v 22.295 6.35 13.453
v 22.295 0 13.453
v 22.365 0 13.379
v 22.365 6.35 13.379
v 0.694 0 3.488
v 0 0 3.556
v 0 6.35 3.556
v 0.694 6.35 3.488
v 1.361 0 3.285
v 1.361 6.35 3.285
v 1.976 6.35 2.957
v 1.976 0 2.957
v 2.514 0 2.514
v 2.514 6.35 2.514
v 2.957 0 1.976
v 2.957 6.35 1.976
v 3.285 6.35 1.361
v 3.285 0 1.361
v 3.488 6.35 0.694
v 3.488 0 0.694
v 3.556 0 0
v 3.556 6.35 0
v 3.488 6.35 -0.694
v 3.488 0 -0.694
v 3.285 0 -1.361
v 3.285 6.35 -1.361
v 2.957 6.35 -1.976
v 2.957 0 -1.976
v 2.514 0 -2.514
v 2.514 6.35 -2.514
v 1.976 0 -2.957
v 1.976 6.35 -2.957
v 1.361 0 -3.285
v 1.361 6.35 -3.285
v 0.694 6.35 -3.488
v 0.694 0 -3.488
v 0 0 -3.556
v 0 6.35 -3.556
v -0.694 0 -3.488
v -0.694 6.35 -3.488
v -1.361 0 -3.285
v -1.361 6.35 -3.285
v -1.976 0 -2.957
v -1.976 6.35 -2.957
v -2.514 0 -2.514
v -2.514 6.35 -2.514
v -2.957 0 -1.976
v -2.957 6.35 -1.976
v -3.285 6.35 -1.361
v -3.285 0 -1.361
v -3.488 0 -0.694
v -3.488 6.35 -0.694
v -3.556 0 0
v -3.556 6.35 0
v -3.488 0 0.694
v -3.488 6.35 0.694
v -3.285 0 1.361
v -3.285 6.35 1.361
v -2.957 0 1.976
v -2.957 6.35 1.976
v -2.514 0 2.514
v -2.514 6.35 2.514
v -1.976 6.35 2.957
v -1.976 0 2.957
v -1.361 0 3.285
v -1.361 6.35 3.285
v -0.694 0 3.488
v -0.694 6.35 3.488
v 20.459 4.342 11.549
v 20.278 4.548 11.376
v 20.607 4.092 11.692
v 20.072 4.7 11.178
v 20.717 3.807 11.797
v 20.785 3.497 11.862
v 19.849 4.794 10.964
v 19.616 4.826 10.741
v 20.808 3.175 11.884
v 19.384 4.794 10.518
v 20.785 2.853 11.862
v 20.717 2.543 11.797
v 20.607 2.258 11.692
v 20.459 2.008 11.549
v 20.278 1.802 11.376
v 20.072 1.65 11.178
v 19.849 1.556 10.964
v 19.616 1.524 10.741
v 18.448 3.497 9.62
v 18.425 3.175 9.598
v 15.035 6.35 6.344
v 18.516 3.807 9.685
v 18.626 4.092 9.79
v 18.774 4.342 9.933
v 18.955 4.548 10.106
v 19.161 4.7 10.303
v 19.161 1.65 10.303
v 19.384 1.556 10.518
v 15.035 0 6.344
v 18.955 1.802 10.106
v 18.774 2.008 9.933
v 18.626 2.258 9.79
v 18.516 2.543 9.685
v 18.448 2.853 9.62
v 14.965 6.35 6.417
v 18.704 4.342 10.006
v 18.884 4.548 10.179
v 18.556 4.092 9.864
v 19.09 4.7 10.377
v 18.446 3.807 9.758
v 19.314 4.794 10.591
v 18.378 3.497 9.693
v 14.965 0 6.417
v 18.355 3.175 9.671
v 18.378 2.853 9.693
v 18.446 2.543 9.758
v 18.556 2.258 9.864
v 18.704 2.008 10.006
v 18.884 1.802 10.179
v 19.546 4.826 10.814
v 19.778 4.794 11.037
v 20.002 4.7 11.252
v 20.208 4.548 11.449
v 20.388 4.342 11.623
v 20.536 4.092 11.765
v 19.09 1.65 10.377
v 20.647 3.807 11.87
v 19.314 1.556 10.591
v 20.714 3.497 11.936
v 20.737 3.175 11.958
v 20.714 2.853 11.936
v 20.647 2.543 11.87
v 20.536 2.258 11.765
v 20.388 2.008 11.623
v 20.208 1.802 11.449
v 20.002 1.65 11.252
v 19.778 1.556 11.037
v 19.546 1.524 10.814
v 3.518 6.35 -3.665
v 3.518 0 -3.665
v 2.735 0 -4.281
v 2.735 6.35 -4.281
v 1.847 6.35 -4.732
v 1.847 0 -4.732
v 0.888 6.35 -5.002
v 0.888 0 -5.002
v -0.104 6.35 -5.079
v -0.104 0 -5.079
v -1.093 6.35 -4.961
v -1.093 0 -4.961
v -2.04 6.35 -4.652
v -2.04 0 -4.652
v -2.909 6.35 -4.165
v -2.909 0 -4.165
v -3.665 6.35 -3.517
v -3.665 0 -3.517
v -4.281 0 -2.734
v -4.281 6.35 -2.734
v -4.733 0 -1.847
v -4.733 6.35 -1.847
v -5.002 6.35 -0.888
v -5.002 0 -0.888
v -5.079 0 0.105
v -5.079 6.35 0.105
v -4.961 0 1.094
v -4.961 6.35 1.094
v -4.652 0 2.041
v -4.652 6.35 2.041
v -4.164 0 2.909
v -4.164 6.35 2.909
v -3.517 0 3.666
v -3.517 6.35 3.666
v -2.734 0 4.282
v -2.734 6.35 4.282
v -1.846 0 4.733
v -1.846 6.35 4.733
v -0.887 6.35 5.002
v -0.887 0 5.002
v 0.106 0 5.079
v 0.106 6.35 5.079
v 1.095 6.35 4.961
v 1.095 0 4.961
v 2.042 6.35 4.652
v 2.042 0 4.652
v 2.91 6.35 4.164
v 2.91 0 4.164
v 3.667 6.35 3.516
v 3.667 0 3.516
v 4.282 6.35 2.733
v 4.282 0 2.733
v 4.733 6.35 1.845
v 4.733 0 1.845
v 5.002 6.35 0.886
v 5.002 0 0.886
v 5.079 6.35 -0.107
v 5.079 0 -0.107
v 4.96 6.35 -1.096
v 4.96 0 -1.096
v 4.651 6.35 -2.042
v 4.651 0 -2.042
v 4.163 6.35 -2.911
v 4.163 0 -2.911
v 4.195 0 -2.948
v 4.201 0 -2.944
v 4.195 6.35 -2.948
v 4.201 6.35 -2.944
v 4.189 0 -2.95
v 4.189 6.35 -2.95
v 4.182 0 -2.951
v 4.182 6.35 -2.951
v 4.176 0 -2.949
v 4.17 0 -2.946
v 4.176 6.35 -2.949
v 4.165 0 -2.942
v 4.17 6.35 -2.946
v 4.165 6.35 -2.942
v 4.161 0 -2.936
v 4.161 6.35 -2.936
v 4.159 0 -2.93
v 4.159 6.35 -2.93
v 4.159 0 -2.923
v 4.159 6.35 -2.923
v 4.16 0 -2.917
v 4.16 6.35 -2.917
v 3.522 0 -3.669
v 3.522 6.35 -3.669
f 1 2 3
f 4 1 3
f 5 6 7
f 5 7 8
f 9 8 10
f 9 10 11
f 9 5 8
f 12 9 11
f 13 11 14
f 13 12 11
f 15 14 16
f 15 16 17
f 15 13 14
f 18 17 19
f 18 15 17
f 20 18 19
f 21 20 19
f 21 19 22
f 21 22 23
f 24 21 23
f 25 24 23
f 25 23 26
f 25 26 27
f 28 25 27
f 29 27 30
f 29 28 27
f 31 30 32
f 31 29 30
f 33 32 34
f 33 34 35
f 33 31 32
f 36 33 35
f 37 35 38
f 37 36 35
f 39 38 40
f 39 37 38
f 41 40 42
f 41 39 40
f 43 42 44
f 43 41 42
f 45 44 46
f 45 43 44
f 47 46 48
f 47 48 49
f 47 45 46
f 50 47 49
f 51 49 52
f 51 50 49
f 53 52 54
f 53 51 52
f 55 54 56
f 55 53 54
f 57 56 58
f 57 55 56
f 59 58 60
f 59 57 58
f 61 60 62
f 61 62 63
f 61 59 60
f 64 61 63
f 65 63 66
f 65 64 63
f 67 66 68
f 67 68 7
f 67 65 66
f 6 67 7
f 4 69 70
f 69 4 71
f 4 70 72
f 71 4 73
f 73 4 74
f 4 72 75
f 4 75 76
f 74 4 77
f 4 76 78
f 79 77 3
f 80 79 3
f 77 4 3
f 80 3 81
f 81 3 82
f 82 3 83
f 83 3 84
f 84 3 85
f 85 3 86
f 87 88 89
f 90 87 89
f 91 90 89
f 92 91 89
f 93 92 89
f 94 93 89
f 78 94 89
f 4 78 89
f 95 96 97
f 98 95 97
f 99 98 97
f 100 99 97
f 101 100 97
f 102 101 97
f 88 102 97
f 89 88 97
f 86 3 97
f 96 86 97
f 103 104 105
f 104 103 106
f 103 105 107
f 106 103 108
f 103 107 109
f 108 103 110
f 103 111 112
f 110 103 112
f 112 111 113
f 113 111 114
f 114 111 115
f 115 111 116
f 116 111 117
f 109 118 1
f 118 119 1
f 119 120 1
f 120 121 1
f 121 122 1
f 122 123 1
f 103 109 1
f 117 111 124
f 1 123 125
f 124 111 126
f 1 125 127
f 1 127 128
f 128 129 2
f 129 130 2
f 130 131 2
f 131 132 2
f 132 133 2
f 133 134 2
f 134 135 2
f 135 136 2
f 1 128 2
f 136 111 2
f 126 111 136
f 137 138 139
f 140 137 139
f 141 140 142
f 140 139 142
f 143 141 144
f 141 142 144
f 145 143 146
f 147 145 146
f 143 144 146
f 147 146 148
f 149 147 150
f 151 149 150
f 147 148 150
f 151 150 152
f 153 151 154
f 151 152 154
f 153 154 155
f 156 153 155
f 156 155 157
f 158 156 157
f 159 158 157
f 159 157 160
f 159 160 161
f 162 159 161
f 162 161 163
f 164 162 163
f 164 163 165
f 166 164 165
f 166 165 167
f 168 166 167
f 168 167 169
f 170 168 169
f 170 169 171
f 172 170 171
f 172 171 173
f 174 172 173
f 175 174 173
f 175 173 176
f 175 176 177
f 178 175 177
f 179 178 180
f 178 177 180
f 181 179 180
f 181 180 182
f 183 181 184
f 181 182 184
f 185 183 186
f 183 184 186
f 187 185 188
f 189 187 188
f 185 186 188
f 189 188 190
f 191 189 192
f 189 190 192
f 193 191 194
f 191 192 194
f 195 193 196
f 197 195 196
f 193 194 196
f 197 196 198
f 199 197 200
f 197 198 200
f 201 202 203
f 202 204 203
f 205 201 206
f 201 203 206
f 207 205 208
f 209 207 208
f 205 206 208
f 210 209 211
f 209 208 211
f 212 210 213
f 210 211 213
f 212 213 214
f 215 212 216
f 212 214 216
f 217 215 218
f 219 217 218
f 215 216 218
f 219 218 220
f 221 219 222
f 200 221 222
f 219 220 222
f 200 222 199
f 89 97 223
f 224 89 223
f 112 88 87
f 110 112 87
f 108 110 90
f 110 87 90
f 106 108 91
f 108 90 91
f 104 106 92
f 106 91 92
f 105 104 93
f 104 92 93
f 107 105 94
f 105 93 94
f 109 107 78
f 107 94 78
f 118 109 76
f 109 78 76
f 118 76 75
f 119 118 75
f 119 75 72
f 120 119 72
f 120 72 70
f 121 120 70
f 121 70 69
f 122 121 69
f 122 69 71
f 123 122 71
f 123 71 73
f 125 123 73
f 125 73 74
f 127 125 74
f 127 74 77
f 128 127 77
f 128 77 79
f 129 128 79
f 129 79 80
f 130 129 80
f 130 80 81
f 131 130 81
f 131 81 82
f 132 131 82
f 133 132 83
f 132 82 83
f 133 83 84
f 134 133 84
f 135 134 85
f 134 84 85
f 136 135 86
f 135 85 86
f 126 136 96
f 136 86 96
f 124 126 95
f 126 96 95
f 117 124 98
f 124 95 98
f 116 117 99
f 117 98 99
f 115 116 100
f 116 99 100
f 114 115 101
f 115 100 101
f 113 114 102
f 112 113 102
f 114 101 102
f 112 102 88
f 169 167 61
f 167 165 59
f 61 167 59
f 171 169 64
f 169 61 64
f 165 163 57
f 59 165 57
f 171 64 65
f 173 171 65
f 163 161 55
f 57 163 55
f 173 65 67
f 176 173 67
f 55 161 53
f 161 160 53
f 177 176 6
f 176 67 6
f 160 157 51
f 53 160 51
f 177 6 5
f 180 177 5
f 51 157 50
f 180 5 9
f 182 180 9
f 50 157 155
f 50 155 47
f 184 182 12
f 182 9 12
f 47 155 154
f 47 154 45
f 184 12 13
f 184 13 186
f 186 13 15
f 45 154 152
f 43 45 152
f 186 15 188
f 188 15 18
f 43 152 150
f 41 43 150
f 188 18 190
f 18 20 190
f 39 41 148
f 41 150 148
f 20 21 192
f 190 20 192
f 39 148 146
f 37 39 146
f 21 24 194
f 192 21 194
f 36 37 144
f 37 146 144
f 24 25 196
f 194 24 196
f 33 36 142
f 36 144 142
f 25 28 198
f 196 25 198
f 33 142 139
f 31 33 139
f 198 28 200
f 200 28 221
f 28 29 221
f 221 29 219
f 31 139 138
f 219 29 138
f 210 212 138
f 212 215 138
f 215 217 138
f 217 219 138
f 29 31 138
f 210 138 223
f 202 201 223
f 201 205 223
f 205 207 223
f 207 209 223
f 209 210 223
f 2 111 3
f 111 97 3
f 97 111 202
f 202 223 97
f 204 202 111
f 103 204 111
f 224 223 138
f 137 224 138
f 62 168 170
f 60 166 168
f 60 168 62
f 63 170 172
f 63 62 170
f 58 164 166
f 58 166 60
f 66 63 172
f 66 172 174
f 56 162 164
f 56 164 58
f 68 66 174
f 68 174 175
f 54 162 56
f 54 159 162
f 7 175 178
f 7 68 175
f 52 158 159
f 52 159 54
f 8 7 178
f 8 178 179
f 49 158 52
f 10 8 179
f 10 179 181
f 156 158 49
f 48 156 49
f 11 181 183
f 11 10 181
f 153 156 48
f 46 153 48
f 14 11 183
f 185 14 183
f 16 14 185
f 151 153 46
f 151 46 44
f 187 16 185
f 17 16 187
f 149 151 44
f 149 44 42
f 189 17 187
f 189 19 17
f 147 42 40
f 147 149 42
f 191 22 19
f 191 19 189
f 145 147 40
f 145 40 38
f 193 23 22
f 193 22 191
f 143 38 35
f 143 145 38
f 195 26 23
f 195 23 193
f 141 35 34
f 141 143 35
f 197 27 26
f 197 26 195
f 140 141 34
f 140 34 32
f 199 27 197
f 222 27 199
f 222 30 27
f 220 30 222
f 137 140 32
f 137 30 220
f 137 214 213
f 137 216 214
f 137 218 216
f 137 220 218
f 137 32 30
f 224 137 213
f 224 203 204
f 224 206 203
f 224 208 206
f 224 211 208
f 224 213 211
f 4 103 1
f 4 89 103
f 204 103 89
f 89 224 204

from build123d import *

# Parameters (mm, degrees)
SKETCH1_R           = 3.556
BOSS_EXTRUDE1_DEPTH = 6.35
SKETCH2_R           = 1.651
CUT_EXTRUDE1_DEPTH  = 6.35
FILLET1_R           = 0.0254


with BuildPart() as part:
    # Sketch1 → Boss-Extrude1 (new body)
    with BuildSketch(Plane(origin=(0, 0, 0), x_dir=(1, 0, 0), z_dir=(0, 1, 0))):
        with BuildLine():
            Line((22.365139772, -13.37924688), (15.035220761, -6.343773385))
            Line((15.035220761, -6.343773385), (3.521977792, 3.669378045))
            Line((3.521977792, 3.669378045), (3.517736747, 3.664959506))
            ThreePointArc((3.517736747, 3.664959506), (-3.784384399, -3.388928255), (4.029432062, 3.093554146))
            Line((4.029432062, 3.093554146), (14.964866026, -6.417072576))
            Line((14.964866026, -6.417072576), (22.294785037, -13.45254607))
            Line((22.294785037, -13.45254607), (22.365139772, -13.37924688))
        make_face()
        with Locations(Location((0, 0, 0), (0, 0, 270))):
            Circle(SKETCH1_R, mode=Mode.SUBTRACT)
    extrude(amount=BOSS_EXTRUDE1_DEPTH)

    # Sketch2 → Cut-Extrude1 (cut)
    with BuildSketch(Plane(origin=(3.305454811, 0, -4.914803593), x_dir=(-0.7214487215857361, 0, -0.6924678636025697), z_dir=(0.6924678636025697, 0, -0.7214487215857361))):
        with Locations((-22.608627396, 3.175)):
            Circle(SKETCH2_R)
    extrude(amount=-CUT_EXTRUDE1_DEPTH, mode=Mode.SUBTRACT)

    # Fillet1
    fillet1_edges = [part.edges().sort_by_distance(p)[0] for p in [
        (4.029432062, 3.175, -3.093554146),
    ]]
    fillet(fillet1_edges, radius=FILLET1_R)


solid = part.part
